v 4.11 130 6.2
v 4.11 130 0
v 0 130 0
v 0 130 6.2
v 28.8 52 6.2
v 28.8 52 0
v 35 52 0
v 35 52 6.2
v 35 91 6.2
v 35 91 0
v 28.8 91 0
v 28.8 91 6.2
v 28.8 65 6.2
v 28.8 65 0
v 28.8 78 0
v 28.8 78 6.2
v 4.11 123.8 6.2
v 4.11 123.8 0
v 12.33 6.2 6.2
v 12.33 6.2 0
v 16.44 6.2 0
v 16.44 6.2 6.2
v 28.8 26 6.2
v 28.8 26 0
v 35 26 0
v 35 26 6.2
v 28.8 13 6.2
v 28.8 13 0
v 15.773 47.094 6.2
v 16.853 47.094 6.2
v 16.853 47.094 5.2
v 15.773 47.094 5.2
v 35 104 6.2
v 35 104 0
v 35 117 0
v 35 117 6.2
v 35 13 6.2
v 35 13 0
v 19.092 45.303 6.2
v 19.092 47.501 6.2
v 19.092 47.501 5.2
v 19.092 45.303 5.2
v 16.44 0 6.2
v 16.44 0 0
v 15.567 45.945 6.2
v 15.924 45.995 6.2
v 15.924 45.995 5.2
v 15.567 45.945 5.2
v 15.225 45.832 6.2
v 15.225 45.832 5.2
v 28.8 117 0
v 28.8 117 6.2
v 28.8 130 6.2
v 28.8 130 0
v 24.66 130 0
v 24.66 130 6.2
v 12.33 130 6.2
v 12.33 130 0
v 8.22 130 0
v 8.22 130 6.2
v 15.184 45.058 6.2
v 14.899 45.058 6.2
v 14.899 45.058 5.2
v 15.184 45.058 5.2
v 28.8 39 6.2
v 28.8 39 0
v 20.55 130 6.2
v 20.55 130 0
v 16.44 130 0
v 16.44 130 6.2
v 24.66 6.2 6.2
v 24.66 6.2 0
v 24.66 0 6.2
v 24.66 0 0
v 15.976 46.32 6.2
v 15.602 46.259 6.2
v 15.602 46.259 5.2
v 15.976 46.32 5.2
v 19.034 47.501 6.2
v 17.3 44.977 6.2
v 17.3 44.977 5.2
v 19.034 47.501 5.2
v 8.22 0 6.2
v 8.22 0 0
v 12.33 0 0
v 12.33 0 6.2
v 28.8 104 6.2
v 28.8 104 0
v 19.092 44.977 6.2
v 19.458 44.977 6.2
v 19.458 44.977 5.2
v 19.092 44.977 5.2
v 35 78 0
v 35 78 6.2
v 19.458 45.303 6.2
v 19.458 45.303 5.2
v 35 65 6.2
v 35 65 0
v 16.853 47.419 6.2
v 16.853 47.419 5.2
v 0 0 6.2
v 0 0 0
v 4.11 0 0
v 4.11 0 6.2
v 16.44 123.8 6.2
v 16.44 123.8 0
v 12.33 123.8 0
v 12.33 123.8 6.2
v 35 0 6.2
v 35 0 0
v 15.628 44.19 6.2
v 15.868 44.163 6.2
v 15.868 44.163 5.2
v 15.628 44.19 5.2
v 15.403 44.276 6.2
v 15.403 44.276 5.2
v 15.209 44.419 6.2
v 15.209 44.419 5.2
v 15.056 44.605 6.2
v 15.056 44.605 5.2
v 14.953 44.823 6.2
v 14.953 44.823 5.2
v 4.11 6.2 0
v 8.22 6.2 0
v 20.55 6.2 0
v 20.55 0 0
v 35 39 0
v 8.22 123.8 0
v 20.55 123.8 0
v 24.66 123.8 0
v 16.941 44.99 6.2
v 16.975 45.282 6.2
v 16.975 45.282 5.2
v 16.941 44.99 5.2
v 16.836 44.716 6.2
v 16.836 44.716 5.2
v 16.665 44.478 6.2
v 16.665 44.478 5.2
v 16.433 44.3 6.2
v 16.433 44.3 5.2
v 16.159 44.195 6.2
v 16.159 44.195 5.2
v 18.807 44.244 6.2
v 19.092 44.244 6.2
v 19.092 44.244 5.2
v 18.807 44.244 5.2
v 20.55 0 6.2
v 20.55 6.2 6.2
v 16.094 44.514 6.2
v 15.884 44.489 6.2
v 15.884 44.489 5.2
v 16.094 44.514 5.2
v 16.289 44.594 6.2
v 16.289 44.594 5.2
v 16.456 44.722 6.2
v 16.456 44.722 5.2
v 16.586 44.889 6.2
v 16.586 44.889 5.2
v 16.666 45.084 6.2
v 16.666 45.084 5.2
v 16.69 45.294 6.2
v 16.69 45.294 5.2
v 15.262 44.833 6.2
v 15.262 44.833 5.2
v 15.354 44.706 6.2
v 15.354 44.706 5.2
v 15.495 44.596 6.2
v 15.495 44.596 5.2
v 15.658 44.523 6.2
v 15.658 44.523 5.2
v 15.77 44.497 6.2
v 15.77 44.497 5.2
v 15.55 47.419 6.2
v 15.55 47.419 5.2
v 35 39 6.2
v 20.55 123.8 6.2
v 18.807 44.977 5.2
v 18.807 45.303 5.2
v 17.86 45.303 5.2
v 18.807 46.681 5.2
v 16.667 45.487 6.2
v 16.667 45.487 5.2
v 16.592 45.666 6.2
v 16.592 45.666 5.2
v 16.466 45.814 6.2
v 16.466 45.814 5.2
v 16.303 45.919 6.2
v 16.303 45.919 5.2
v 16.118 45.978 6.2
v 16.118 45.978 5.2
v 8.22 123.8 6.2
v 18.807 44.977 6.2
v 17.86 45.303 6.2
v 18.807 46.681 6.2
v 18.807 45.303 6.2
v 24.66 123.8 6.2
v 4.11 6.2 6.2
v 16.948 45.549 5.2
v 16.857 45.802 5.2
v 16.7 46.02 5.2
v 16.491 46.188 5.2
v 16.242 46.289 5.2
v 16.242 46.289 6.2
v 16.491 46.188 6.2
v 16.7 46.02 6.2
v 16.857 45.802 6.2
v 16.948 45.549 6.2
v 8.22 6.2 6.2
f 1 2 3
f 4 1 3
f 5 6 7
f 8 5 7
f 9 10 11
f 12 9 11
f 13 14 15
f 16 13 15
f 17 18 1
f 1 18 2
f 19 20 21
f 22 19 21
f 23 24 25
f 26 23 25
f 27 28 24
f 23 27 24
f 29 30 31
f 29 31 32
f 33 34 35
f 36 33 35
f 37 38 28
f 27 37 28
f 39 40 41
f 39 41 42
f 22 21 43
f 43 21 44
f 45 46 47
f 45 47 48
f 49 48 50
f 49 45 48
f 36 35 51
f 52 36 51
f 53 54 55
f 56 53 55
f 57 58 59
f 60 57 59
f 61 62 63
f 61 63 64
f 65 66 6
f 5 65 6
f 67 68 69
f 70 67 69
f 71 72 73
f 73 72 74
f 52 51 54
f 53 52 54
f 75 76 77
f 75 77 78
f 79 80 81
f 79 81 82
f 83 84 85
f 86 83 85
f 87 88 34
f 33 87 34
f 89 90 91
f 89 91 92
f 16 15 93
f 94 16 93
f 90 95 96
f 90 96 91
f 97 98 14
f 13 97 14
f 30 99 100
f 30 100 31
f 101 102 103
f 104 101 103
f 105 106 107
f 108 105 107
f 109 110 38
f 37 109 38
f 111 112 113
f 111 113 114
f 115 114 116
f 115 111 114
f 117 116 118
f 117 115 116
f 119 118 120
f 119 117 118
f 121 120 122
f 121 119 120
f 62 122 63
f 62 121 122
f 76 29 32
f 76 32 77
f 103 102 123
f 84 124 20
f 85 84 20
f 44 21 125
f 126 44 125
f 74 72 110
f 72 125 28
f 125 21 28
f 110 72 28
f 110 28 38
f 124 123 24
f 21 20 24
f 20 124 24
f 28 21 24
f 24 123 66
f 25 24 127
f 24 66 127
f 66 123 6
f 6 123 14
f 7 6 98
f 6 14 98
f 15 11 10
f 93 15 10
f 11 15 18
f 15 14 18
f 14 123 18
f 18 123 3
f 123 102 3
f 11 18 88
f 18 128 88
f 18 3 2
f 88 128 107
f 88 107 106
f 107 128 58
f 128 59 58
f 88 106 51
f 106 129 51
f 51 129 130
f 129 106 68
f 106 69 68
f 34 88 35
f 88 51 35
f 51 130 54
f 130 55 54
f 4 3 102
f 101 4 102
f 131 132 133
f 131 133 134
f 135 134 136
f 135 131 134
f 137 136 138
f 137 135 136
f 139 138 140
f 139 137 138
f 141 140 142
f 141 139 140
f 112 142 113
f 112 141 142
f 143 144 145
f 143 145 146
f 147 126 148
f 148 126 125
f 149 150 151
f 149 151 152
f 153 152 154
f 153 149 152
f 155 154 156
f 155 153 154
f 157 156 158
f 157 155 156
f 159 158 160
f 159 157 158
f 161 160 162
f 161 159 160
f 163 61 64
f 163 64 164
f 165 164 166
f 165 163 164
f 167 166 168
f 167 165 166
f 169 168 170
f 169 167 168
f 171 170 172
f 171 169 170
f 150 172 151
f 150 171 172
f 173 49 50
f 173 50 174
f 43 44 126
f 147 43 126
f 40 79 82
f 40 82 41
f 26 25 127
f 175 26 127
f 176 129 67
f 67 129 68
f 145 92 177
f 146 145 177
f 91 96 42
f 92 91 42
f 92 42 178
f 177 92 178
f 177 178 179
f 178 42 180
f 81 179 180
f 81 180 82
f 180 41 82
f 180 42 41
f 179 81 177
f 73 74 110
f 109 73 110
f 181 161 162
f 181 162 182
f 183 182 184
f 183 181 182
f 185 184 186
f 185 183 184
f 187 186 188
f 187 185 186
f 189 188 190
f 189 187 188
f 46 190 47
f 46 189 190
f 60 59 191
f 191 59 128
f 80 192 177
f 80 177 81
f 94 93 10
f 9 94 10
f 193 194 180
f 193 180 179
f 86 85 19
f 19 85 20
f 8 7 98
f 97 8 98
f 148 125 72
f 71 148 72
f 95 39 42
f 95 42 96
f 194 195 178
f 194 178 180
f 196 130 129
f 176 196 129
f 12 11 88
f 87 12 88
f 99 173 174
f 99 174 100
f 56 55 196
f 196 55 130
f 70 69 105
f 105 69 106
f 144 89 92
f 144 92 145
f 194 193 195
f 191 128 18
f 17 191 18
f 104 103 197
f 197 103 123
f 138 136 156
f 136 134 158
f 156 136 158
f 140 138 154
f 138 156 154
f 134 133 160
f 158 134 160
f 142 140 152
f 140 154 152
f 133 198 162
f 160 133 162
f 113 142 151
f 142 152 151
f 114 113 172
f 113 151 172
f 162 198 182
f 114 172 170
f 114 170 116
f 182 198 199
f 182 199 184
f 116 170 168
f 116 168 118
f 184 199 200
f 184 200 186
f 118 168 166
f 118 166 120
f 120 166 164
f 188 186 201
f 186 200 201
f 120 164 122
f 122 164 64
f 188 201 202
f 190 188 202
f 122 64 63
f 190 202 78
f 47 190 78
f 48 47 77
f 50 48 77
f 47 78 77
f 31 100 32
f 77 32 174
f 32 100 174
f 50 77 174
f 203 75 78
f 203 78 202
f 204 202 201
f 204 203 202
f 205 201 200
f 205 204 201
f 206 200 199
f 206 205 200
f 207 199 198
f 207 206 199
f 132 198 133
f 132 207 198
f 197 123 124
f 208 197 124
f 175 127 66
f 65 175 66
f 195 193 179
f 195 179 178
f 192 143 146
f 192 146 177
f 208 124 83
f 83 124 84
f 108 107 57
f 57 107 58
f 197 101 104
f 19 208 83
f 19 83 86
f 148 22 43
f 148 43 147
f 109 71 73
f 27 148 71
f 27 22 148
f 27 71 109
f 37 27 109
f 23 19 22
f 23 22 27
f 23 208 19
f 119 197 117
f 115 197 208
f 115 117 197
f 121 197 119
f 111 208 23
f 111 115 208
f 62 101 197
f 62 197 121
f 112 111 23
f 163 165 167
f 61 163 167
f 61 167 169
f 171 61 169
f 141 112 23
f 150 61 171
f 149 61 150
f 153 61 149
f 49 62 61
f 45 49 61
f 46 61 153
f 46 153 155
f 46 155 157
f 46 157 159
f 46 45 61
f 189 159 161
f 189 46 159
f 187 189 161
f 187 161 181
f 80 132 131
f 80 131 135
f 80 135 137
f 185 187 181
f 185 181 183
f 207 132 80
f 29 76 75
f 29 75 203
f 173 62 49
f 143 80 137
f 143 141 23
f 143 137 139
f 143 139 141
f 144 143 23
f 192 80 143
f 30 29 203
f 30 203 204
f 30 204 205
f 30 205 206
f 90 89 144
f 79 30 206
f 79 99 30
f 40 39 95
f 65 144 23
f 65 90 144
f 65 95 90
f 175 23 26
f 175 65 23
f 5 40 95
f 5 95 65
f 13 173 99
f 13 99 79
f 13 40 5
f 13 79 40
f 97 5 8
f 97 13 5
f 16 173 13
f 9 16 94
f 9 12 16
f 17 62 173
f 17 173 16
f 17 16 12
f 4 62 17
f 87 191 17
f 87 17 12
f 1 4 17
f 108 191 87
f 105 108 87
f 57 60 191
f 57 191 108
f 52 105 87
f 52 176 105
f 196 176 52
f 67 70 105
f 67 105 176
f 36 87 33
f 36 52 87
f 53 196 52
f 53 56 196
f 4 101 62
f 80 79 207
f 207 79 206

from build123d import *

# Parameters (mm, degrees)
BOSS_EXTRUDE7_DEPTH = 6.2
CUT_EXTRUDE10_DEPTH = 1


with BuildPart() as part:
    # Sketch1 → Boss-Extrude7 (new body)
    with BuildSketch(Plane.XY):
        Polygon((4.11, 130), (0, 130), (0, 0), (4.11, 0), (4.11, 6.2), (8.22, 6.2), (8.22, 0), (12.33, 0), (12.33, 6.2), (16.44, 6.2), (16.44, 0), (20.55, 0), (20.55, 6.2), (24.66, 6.2), (24.66, 0), (35, 0), (35, 13), (28.8, 13), (28.8, 26), (35, 26), (35, 39), (28.8, 39), (28.8, 52), (35, 52), (35, 65), (28.8, 65), (28.8, 78), (35, 78), (35, 91), (28.8, 91), (28.8, 104), (35, 104), (35, 117), (28.8, 117), (28.8, 130), (24.66, 130), (24.66, 123.8), (20.55, 123.8), (20.55, 130), (16.44, 130), (16.44, 123.8), (12.33, 123.8), (12.33, 130), (8.22, 130), (8.22, 123.8), (4.11, 123.8), align=None)
    extrude(amount=BOSS_EXTRUDE7_DEPTH)

    # Sketch7 → Cut-Extrude10 (cut)
    with BuildSketch(Plane.XY.offset(6.2)):
        with BuildLine():
            Line((16.852728424, 47.419269681), (16.852728424, 47.093628655))
            Line((16.852728424, 47.093628655), (15.772770491, 47.093628655))
            Line((15.772770491, 47.093628655), (15.601681749, 46.25853751))
            add(Edge.make_bspline(
                [(15.601681749, 46.25853751), (15.635296721, 46.267817828), (15.700420412, 46.285796976), (15.796541143, 46.305759353), (15.887792642, 46.317793006), (15.947006728, 46.319436124), (15.975660115, 46.32023122)],
                knots=[0, 0, 0, 0, 0.000104595, 0.000202637, 0.000294305, 0.000380252, 0.000380252, 0.000380252, 0.000380252], degree=3))
            add(Edge.make_bspline(
                [(15.975660115, 46.32023122), (16.01111465, 46.319463835), (16.080827125, 46.317954965), (16.182825312, 46.303466216), (16.28019158, 46.280660722), (16.372722301, 46.248801392), (16.460588658, 46.208061848), (16.542982232, 46.157171188), (16.621139767, 46.097723095), (16.69365912, 46.029374405), (16.759449028, 45.954152653), (16.81729389, 45.873273727), (16.866427097, 45.787523633), (16.905942925, 45.696083081), (16.937497285, 45.599962992), (16.958499452, 45.498152006), (16.972484609, 45.391609783), (16.97404706, 45.318762066), (16.974843809, 45.281614433)],
                knots=[0, 0, 0, 0, 0.000106308, 0.000209029, 0.000308378, 0.000405929, 0.000502102, 0.000598312, 0.00069588, 0.000796219, 0.000896736, 0.000995218, 0.001094066, 0.001192613, 0.001293582, 0.001396995, 0.001504047, 0.001615439, 0.001615439, 0.001615439, 0.001615439], degree=3))
            add(Edge.make_bspline(
                [(16.974843809, 45.281614433), (16.97424049, 45.255740704), (16.973042007, 45.204342908), (16.966947288, 45.128012098), (16.955212746, 45.053297242), (16.939457739, 44.980188429), (16.919008546, 44.90882407), (16.894253475, 44.838999899), (16.863958507, 44.771150505), (16.830728617, 44.704633897), (16.793312169, 44.640953823), (16.751784523, 44.581400813), (16.707910113, 44.525081501), (16.660701142, 44.4725999), (16.609718811, 44.424300877), (16.555580555, 44.379897793), (16.498718374, 44.338639729), (16.438252547, 44.302201438), (16.375530438, 44.268670756), (16.309646269, 44.241162976), (16.242099777, 44.216569854), (16.171918783, 44.196966925), (16.099262253, 44.181606679), (16.024010421, 44.171173992), (15.946557956, 44.163575366), (15.894057051, 44.1630997), (15.867537118, 44.162859425)],
                knots=[0, 0, 0, 0, 7.7636e-05, 0.000154223, 0.000229512, 0.000304362, 0.000378447, 0.000452077, 0.000526407, 0.000601214, 0.00067506, 0.000747747, 0.00081887, 0.000889121, 0.000959302, 0.001029336, 0.001099058, 0.00116985, 0.001240974, 0.00131221, 0.00138383, 0.001456517, 0.001530612, 0.001606437, 0.001684346, 0.001763871, 0.001763871, 0.001763871, 0.001763871], degree=3))
            add(Edge.make_bspline(
                [(15.867537118, 44.162859425), (15.835901254, 44.163486113), (15.773661429, 44.164719049), (15.682474915, 44.177617247), (15.594740951, 44.196090228), (15.511165788, 44.223881701), (15.431000427, 44.258704462), (15.355324104, 44.30271556), (15.28220315, 44.352589461), (15.214610088, 44.41144521), (15.151875614, 44.475775865), (15.095717567, 44.545587439), (15.045703536, 44.619727719), (15.002634437, 44.698556758), (14.965896947, 44.781867426), (14.937036207, 44.869971862), (14.913742271, 44.962409723), (14.903887597, 45.026048979), (14.89888227, 45.058372245)],
                knots=[0, 0, 0, 0, 9.4843e-05, 0.000186593, 0.000275792, 0.000363484, 0.000450342, 0.000537514, 0.000625728, 0.000715478, 0.000805885, 0.000894984, 0.00098389, 0.001073836, 0.001164117, 0.001256635, 0.001351658, 0.001449737, 0.001449737, 0.001449737, 0.001449737], degree=3))
            Line((14.89888227, 45.058372245), (15.183818168, 45.058372245))
            add(Edge.make_bspline(
                [(15.183818168, 45.058372245), (15.190829073, 45.028095035), (15.204304423, 44.969900555), (15.233882495, 44.888138553), (15.270046539, 44.815277543), (15.313049055, 44.750353706), (15.364348012, 44.69373983), (15.422885422, 44.64328721), (15.488515143, 44.5977712), (15.561443286, 44.559831975), (15.638380866, 44.52747532), (15.718905406, 44.50592914), (15.800824349, 44.490779044), (15.856231156, 44.489262518), (15.884073576, 44.48850045)],
                knots=[0, 0, 0, 0, 9.3172e-05, 0.000179081, 0.000260145, 0.000336703, 0.000411917, 0.000488562, 0.000568128, 0.000650923, 0.00073478, 0.000817953, 0.000900557, 0.000983994, 0.000983994, 0.000983994, 0.000983994], degree=3))
            add(Edge.make_bspline(
                [(15.884073576, 44.48850045), (15.911250165, 44.489245013), (15.964761091, 44.490711063), (16.04351142, 44.501995024), (16.11954167, 44.519373678), (16.19210163, 44.545381332), (16.262461026, 44.57699047), (16.32884009, 44.617553432), (16.393159128, 44.66423502), (16.453418935, 44.717717106), (16.508609007, 44.7766539), (16.557373488, 44.839679821), (16.597992545, 44.906914389), (16.632222773, 44.977193606), (16.658215408, 45.051287726), (16.676758298, 45.128849506), (16.687646787, 45.210070524), (16.689144643, 45.265469112), (16.689907911, 45.293698768)],
                knots=[0, 0, 0, 0, 8.15e-05, 0.000160473, 0.000238226, 0.000315066, 0.000391338, 0.000469218, 0.000547964, 0.000629516, 0.000710512, 0.000789892, 0.000868102, 0.000945761, 0.001024012, 0.00110315, 0.001184644, 0.001269321, 0.001269321, 0.001269321, 0.001269321], degree=3))
            add(Edge.make_bspline(
                [(16.689907911, 45.293698768), (16.689310576, 45.319167485), (16.688141378, 45.369018876), (16.678588646, 45.441952442), (16.661972536, 45.510961559), (16.638909445, 45.576379471), (16.60962732, 45.638267879), (16.573843879, 45.696690655), (16.530887583, 45.750877776), (16.481818512, 45.800854592), (16.428063004, 45.846978157), (16.36869618, 45.886297436), (16.304960389, 45.919375418), (16.237623538, 45.947921388), (16.165083952, 45.968423493), (16.08877815, 45.983815789), (16.007882136, 45.992719725), (15.952573012, 45.993955152), (15.924142687, 45.994590194)],
                knots=[0, 0, 0, 0, 7.6388e-05, 0.000149519, 0.000220172, 0.000288967, 0.000357247, 0.000425206, 0.000494043, 0.000564207, 0.000635056, 0.000706145, 0.000777268, 0.000850264, 0.000925136, 0.001002969, 0.001083601, 0.001168886, 0.001168886, 0.001168886, 0.001168886], degree=3))
            add(Edge.make_bspline(
                [(15.924142687, 45.994590194), (15.899532873, 45.994063515), (15.84871985, 45.992976056), (15.770775572, 45.984969162), (15.68886808, 45.972052088), (15.603311359, 45.954284564), (15.51384847, 45.931033516), (15.420668206, 45.903171076), (15.32357465, 45.869858977), (15.258153572, 45.844701897), (15.224523296, 45.831769681)],
                knots=[0, 0, 0, 0, 7.3822e-05, 0.000152423, 0.000234822, 0.000322511, 0.00041445, 0.000512043, 0.000614219, 0.000722306, 0.000722306, 0.000722306, 0.000722306], degree=3))
            Line((15.224523296, 45.831769681), (15.550164321, 47.419269681))
            Line((15.550164321, 47.419269681), (16.852728424, 47.419269681))
        make_face()
        Polygon((19.033632871, 47.500679937), (19.091510475, 47.500679937), (19.091510475, 45.302603014), (19.457856629, 45.302603014), (19.457856629, 44.976961989), (19.091510475, 44.976961989), (19.091510475, 44.244269681), (18.806574578, 44.244269681), (18.806574578, 44.976961989), (17.300484834, 44.976961989), align=None)
        Polygon((18.806574578, 45.302603014), (18.806574578, 46.681489232), (17.860180347, 45.302603014), align=None, mode=Mode.SUBTRACT)
    extrude(amount=-CUT_EXTRUDE10_DEPTH, mode=Mode.SUBTRACT)


solid = part.part
